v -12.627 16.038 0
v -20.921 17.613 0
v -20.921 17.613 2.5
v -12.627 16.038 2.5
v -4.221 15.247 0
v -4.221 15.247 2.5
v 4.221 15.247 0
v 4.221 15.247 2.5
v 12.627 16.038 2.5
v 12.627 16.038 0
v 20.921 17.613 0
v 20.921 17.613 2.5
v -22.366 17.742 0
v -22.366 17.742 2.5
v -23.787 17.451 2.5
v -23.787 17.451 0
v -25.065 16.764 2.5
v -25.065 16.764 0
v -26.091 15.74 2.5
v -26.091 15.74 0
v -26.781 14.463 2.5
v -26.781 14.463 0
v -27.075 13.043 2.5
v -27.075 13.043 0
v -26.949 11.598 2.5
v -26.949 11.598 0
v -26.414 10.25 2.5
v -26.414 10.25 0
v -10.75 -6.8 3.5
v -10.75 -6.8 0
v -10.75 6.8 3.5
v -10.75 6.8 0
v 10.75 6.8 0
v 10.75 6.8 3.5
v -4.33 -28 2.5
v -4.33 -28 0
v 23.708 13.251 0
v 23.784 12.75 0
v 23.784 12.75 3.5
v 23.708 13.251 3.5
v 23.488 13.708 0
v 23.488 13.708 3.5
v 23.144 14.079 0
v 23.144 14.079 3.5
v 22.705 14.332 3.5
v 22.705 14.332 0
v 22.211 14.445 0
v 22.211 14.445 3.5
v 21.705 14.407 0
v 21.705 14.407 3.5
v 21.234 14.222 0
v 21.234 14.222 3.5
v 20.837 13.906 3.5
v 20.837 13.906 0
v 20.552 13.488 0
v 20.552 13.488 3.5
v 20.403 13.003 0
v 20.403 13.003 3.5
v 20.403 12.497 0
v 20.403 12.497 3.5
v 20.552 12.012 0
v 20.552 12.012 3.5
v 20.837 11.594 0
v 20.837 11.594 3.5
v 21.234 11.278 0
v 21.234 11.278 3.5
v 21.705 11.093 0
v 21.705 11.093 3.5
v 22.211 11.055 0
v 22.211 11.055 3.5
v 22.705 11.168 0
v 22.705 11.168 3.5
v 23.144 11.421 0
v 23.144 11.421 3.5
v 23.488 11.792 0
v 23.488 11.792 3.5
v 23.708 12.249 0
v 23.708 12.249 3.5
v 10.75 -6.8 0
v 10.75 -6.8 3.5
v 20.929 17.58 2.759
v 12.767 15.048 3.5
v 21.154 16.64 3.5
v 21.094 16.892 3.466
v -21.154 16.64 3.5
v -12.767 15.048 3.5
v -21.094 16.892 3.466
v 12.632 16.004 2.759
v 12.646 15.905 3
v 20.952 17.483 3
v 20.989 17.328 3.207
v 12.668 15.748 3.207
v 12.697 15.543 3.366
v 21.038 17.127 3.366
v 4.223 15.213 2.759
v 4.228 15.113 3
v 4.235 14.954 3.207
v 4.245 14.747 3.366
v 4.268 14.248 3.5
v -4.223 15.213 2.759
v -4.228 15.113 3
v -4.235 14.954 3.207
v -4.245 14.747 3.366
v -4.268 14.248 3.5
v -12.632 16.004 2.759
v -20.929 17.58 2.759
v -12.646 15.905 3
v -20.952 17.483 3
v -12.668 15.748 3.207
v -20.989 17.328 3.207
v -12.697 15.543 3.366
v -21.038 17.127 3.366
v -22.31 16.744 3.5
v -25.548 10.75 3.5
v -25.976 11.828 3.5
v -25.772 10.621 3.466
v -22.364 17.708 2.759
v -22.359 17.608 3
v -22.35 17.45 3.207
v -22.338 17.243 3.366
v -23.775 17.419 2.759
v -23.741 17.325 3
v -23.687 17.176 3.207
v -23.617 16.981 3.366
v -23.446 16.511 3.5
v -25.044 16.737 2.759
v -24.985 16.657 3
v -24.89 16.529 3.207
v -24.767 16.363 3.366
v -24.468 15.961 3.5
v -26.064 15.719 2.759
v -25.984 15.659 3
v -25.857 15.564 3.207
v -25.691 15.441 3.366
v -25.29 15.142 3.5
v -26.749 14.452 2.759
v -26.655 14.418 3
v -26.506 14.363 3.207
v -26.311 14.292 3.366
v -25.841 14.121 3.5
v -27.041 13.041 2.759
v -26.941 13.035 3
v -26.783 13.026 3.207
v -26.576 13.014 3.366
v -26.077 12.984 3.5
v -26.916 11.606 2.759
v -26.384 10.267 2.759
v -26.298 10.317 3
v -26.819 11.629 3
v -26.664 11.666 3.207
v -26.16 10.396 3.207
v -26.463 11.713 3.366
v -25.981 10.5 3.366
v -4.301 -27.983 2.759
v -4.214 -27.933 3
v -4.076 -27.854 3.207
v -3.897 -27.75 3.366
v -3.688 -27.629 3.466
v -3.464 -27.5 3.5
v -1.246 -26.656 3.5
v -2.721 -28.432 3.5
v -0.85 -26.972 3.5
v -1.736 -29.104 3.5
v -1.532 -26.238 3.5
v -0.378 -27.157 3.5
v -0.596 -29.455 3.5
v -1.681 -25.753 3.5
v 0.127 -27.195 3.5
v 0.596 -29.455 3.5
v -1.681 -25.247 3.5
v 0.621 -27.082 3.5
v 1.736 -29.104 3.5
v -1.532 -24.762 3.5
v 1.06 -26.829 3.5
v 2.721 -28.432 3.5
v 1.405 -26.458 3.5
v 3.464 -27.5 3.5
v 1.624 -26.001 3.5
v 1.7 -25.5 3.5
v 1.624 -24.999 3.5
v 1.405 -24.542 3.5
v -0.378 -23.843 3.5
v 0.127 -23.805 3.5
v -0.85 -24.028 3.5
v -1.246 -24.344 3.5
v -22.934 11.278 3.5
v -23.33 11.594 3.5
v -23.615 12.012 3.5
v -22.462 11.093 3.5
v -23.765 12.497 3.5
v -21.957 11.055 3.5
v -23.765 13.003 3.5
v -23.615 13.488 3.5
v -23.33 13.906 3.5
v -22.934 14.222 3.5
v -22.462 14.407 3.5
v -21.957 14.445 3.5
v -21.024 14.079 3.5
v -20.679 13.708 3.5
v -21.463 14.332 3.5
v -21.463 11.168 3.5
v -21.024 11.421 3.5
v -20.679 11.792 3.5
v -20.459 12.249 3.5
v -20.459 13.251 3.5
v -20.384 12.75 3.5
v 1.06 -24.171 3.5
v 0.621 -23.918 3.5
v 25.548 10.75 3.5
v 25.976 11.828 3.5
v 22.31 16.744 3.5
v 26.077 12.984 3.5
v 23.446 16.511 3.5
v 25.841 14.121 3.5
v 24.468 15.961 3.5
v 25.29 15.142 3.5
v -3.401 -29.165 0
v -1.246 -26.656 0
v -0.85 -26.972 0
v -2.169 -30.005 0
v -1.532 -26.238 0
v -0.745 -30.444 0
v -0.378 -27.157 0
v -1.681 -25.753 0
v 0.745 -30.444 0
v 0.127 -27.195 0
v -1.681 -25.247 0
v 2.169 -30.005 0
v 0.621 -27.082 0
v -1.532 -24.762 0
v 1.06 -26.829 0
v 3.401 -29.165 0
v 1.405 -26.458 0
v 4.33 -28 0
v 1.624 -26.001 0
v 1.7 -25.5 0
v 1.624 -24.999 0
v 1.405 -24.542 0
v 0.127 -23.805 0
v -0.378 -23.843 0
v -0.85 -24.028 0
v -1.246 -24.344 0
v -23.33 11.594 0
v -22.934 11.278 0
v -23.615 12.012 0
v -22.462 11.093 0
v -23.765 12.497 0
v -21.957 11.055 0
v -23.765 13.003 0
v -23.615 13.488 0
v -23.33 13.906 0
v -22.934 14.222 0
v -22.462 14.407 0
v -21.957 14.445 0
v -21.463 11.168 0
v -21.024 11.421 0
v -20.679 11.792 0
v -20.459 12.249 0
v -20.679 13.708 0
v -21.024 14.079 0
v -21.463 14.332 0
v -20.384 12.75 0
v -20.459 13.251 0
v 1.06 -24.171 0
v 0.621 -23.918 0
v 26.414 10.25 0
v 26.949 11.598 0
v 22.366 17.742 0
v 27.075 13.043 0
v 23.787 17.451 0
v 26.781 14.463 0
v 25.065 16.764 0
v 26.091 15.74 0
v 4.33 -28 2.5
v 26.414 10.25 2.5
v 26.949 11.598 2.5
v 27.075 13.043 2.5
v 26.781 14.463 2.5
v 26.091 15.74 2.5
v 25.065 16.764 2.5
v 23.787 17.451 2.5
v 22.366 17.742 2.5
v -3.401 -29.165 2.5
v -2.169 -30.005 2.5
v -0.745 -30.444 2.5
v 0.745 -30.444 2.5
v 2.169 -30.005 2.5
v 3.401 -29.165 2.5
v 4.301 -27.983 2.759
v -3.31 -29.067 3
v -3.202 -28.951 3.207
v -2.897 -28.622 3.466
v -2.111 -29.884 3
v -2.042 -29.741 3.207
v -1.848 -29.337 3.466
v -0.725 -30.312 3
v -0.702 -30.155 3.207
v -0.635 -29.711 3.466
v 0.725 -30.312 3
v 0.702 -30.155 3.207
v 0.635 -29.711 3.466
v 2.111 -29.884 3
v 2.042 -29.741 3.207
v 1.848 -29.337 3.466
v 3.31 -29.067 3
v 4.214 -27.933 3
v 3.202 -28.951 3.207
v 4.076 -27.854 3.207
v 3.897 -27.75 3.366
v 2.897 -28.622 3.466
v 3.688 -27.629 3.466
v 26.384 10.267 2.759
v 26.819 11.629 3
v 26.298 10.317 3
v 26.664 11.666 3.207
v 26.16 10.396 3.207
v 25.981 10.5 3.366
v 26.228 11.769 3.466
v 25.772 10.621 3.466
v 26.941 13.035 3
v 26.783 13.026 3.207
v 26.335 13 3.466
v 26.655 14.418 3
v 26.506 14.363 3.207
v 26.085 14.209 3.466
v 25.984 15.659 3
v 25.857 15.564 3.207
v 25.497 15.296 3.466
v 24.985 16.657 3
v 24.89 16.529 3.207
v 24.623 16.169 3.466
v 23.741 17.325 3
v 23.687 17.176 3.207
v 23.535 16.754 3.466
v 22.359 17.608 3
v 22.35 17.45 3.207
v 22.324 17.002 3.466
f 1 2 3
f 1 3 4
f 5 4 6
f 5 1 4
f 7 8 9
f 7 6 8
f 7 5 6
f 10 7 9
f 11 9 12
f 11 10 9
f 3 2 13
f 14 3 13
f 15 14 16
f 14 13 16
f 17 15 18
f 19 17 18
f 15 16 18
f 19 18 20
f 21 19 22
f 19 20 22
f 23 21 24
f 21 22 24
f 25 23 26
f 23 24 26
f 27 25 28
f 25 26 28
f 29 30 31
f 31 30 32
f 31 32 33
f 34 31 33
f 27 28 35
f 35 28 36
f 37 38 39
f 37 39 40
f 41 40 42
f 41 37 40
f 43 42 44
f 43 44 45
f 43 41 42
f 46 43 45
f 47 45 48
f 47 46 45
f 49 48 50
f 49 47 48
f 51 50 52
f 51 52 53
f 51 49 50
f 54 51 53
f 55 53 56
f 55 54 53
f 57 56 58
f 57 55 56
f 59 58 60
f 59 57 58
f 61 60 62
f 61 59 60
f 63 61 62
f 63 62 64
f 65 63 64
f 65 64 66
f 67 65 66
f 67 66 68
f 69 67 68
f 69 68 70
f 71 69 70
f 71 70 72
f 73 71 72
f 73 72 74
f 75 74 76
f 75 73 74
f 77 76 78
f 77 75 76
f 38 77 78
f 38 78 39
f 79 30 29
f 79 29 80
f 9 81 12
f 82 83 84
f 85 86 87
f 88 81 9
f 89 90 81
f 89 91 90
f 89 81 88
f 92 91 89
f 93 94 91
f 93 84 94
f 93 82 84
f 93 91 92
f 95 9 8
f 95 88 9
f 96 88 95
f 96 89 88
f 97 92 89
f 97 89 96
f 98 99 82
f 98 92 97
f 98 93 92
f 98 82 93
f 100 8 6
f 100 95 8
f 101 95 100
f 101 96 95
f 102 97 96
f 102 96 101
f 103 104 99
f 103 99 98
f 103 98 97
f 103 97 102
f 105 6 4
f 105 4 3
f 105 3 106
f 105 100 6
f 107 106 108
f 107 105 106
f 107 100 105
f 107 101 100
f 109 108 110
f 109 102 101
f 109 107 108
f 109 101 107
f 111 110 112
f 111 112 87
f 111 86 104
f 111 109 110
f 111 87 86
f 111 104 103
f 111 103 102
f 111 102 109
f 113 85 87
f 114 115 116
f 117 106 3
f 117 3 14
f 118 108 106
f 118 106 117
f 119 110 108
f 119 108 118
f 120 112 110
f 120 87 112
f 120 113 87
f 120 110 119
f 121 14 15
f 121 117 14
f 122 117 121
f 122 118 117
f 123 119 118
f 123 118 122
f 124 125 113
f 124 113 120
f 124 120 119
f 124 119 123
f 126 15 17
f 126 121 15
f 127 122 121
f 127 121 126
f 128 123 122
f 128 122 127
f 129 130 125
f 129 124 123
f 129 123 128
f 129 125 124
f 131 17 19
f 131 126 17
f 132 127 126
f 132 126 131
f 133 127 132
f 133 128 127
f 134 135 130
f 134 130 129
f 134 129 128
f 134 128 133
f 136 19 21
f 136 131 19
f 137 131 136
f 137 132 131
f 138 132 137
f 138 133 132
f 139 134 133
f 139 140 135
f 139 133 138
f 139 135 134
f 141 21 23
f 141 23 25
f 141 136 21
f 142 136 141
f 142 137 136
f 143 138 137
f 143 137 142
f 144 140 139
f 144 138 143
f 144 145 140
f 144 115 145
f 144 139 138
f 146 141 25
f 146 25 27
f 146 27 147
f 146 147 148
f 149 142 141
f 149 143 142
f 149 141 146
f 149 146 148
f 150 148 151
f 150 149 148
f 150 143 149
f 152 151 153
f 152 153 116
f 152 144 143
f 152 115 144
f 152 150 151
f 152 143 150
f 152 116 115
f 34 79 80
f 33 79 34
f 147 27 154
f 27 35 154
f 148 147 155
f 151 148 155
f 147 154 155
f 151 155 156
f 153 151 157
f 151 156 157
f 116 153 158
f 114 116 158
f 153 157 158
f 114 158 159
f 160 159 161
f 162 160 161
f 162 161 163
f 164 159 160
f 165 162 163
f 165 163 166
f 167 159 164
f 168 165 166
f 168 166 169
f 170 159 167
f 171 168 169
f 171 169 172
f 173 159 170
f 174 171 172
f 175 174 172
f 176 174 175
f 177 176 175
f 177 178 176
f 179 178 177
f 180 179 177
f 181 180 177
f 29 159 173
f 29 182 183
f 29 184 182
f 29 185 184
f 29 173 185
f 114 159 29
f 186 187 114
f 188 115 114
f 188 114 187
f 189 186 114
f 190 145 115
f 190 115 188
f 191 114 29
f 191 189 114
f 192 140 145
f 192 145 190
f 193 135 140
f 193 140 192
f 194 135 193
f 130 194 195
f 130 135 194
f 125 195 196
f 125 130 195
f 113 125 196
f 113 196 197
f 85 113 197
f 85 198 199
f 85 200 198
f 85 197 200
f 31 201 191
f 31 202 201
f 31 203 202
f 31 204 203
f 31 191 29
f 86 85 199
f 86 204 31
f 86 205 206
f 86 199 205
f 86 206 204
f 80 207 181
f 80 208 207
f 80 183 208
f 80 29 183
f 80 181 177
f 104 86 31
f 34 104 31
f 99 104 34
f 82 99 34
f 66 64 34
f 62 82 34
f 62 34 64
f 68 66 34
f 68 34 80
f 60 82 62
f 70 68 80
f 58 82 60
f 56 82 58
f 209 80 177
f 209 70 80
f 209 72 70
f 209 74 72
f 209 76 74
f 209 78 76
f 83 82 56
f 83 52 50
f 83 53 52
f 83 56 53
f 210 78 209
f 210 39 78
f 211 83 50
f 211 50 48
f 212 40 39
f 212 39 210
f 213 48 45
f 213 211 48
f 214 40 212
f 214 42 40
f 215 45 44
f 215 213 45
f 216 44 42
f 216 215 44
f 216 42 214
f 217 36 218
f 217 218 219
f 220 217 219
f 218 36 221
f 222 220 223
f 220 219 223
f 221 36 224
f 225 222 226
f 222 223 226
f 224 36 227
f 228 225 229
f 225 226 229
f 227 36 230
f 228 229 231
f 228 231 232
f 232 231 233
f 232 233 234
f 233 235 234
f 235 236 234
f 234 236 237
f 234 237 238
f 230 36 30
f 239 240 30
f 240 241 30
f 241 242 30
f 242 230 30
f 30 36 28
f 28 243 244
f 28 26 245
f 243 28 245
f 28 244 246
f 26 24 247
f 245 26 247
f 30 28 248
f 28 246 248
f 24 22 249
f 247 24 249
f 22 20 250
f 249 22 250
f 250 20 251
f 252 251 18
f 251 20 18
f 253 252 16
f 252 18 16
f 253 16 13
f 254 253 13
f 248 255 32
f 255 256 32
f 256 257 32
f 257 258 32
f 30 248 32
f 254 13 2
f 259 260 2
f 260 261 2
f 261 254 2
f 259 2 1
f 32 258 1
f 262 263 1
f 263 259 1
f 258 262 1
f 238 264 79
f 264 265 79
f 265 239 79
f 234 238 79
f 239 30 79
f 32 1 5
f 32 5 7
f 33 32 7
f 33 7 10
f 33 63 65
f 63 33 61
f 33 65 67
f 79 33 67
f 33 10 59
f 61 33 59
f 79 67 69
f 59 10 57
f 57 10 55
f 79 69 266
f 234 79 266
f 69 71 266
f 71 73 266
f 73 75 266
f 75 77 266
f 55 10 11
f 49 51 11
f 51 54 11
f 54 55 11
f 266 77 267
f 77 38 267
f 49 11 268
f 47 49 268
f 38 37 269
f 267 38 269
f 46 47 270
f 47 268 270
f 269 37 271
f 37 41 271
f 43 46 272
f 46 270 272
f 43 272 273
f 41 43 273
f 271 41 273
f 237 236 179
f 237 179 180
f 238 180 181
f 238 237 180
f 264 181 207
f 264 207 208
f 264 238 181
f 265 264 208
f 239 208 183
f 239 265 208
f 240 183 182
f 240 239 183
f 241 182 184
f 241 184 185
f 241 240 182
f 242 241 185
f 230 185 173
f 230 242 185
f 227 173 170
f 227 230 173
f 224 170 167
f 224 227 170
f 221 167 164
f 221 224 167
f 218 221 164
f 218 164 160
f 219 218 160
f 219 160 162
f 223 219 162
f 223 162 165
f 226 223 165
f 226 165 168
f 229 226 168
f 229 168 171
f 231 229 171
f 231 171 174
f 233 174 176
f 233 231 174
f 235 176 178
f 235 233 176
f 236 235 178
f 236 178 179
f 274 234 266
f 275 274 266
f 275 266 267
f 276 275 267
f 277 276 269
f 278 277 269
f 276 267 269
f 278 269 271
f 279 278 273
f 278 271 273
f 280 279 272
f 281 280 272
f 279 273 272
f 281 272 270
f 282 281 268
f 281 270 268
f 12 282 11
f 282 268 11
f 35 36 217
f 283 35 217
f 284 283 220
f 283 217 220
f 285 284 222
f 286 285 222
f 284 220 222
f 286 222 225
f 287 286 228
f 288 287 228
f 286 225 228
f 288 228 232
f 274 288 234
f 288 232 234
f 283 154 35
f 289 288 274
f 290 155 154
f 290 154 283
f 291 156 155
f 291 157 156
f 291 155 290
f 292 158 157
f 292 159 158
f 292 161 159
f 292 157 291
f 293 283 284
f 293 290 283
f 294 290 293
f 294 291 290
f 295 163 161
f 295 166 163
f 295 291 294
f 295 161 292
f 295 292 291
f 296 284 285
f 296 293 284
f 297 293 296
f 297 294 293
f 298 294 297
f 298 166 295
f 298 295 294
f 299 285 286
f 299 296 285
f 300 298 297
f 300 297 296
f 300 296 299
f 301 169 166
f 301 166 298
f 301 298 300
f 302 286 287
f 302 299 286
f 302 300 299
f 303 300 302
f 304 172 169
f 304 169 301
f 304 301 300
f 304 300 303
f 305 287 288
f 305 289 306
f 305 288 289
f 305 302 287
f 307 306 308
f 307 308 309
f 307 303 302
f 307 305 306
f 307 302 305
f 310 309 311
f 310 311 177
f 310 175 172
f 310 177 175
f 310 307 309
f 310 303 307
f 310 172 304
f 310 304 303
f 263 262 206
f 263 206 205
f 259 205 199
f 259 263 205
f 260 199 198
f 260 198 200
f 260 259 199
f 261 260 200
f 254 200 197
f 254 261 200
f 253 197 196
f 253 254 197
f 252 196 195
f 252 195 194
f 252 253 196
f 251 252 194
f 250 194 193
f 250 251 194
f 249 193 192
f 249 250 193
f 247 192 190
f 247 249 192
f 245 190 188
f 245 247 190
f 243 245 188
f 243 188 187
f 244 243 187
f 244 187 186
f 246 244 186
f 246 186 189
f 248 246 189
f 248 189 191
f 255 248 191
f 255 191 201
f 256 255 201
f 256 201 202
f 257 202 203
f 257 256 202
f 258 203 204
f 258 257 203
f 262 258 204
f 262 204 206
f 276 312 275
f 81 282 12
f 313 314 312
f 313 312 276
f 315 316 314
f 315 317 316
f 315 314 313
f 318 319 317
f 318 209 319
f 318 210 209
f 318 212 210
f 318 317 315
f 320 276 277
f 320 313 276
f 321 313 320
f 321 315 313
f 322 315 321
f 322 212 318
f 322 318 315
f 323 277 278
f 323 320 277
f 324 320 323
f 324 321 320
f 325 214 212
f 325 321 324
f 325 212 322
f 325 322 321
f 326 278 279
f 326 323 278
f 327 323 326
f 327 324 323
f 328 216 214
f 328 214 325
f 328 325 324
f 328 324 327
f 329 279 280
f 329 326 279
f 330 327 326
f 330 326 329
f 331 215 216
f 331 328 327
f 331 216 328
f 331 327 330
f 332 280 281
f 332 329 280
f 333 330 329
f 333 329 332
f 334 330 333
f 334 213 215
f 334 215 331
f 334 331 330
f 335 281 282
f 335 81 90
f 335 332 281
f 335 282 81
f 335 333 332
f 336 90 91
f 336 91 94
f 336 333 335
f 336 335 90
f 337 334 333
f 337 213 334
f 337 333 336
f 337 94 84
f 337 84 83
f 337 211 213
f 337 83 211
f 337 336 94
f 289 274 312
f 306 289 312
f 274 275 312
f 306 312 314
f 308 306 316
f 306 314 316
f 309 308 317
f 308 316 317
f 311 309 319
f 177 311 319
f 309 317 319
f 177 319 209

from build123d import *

# Parameters (mm, degrees)
SKETCH_R  = 1.7
SKETCH_W  = 21.5
SKETCH_H  = 13.6
PAD_DEPTH = 3.5
FILLET_R  = 1


with BuildPart() as part:
    # Sketch → Pad (new body)
    with BuildSketch(Plane.XY):
        with BuildLine():
            ThreePointArc((-20.921351, 17.61303), (-26.091433, 15.739591), (-26.413774, 10.249999))
            Line((-26.413774, 10.249999), (-4.330127, -28))
            ThreePointArc((-4.330127, -28), (0, -30.5), (4.330127, -28))
            Line((4.330127, -28), (26.413774, 10.249998))
            ThreePointArc((26.413774, 10.249998), (26.091434, 15.739591), (20.921351, 17.61303))
            ThreePointArc((-20.921351, 17.61303), (0, 15.147578), (20.921351, 17.61303))
        make_face()
        with Locations((-22.083648, 12.75)):
            Circle(SKETCH_R, mode=Mode.SUBTRACT)
        with Locations((22.083648, 12.75)):
            Circle(SKETCH_R, mode=Mode.SUBTRACT)
        with Locations((0, -25.5)):
            Circle(SKETCH_R, mode=Mode.SUBTRACT)
        Rectangle(SKETCH_W, SKETCH_H, mode=Mode.SUBTRACT)
    extrude(amount=PAD_DEPTH)

    # Fillet
    fillet_edges = [part.edges().sort_by_distance(p)[0] for p in [
        (-15.371951, -8.875001, 3.5),
        (-26.091433, 15.739591, 3.5),
        (0, 15.147578, 3.5),
        (26.091434, 15.739591, 3.5),
        (15.37195, -8.875001, 3.5),
        (0, -30.5, 3.5),
    ]]
    fillet(fillet_edges, radius=FILLET_R)


solid = part.part
